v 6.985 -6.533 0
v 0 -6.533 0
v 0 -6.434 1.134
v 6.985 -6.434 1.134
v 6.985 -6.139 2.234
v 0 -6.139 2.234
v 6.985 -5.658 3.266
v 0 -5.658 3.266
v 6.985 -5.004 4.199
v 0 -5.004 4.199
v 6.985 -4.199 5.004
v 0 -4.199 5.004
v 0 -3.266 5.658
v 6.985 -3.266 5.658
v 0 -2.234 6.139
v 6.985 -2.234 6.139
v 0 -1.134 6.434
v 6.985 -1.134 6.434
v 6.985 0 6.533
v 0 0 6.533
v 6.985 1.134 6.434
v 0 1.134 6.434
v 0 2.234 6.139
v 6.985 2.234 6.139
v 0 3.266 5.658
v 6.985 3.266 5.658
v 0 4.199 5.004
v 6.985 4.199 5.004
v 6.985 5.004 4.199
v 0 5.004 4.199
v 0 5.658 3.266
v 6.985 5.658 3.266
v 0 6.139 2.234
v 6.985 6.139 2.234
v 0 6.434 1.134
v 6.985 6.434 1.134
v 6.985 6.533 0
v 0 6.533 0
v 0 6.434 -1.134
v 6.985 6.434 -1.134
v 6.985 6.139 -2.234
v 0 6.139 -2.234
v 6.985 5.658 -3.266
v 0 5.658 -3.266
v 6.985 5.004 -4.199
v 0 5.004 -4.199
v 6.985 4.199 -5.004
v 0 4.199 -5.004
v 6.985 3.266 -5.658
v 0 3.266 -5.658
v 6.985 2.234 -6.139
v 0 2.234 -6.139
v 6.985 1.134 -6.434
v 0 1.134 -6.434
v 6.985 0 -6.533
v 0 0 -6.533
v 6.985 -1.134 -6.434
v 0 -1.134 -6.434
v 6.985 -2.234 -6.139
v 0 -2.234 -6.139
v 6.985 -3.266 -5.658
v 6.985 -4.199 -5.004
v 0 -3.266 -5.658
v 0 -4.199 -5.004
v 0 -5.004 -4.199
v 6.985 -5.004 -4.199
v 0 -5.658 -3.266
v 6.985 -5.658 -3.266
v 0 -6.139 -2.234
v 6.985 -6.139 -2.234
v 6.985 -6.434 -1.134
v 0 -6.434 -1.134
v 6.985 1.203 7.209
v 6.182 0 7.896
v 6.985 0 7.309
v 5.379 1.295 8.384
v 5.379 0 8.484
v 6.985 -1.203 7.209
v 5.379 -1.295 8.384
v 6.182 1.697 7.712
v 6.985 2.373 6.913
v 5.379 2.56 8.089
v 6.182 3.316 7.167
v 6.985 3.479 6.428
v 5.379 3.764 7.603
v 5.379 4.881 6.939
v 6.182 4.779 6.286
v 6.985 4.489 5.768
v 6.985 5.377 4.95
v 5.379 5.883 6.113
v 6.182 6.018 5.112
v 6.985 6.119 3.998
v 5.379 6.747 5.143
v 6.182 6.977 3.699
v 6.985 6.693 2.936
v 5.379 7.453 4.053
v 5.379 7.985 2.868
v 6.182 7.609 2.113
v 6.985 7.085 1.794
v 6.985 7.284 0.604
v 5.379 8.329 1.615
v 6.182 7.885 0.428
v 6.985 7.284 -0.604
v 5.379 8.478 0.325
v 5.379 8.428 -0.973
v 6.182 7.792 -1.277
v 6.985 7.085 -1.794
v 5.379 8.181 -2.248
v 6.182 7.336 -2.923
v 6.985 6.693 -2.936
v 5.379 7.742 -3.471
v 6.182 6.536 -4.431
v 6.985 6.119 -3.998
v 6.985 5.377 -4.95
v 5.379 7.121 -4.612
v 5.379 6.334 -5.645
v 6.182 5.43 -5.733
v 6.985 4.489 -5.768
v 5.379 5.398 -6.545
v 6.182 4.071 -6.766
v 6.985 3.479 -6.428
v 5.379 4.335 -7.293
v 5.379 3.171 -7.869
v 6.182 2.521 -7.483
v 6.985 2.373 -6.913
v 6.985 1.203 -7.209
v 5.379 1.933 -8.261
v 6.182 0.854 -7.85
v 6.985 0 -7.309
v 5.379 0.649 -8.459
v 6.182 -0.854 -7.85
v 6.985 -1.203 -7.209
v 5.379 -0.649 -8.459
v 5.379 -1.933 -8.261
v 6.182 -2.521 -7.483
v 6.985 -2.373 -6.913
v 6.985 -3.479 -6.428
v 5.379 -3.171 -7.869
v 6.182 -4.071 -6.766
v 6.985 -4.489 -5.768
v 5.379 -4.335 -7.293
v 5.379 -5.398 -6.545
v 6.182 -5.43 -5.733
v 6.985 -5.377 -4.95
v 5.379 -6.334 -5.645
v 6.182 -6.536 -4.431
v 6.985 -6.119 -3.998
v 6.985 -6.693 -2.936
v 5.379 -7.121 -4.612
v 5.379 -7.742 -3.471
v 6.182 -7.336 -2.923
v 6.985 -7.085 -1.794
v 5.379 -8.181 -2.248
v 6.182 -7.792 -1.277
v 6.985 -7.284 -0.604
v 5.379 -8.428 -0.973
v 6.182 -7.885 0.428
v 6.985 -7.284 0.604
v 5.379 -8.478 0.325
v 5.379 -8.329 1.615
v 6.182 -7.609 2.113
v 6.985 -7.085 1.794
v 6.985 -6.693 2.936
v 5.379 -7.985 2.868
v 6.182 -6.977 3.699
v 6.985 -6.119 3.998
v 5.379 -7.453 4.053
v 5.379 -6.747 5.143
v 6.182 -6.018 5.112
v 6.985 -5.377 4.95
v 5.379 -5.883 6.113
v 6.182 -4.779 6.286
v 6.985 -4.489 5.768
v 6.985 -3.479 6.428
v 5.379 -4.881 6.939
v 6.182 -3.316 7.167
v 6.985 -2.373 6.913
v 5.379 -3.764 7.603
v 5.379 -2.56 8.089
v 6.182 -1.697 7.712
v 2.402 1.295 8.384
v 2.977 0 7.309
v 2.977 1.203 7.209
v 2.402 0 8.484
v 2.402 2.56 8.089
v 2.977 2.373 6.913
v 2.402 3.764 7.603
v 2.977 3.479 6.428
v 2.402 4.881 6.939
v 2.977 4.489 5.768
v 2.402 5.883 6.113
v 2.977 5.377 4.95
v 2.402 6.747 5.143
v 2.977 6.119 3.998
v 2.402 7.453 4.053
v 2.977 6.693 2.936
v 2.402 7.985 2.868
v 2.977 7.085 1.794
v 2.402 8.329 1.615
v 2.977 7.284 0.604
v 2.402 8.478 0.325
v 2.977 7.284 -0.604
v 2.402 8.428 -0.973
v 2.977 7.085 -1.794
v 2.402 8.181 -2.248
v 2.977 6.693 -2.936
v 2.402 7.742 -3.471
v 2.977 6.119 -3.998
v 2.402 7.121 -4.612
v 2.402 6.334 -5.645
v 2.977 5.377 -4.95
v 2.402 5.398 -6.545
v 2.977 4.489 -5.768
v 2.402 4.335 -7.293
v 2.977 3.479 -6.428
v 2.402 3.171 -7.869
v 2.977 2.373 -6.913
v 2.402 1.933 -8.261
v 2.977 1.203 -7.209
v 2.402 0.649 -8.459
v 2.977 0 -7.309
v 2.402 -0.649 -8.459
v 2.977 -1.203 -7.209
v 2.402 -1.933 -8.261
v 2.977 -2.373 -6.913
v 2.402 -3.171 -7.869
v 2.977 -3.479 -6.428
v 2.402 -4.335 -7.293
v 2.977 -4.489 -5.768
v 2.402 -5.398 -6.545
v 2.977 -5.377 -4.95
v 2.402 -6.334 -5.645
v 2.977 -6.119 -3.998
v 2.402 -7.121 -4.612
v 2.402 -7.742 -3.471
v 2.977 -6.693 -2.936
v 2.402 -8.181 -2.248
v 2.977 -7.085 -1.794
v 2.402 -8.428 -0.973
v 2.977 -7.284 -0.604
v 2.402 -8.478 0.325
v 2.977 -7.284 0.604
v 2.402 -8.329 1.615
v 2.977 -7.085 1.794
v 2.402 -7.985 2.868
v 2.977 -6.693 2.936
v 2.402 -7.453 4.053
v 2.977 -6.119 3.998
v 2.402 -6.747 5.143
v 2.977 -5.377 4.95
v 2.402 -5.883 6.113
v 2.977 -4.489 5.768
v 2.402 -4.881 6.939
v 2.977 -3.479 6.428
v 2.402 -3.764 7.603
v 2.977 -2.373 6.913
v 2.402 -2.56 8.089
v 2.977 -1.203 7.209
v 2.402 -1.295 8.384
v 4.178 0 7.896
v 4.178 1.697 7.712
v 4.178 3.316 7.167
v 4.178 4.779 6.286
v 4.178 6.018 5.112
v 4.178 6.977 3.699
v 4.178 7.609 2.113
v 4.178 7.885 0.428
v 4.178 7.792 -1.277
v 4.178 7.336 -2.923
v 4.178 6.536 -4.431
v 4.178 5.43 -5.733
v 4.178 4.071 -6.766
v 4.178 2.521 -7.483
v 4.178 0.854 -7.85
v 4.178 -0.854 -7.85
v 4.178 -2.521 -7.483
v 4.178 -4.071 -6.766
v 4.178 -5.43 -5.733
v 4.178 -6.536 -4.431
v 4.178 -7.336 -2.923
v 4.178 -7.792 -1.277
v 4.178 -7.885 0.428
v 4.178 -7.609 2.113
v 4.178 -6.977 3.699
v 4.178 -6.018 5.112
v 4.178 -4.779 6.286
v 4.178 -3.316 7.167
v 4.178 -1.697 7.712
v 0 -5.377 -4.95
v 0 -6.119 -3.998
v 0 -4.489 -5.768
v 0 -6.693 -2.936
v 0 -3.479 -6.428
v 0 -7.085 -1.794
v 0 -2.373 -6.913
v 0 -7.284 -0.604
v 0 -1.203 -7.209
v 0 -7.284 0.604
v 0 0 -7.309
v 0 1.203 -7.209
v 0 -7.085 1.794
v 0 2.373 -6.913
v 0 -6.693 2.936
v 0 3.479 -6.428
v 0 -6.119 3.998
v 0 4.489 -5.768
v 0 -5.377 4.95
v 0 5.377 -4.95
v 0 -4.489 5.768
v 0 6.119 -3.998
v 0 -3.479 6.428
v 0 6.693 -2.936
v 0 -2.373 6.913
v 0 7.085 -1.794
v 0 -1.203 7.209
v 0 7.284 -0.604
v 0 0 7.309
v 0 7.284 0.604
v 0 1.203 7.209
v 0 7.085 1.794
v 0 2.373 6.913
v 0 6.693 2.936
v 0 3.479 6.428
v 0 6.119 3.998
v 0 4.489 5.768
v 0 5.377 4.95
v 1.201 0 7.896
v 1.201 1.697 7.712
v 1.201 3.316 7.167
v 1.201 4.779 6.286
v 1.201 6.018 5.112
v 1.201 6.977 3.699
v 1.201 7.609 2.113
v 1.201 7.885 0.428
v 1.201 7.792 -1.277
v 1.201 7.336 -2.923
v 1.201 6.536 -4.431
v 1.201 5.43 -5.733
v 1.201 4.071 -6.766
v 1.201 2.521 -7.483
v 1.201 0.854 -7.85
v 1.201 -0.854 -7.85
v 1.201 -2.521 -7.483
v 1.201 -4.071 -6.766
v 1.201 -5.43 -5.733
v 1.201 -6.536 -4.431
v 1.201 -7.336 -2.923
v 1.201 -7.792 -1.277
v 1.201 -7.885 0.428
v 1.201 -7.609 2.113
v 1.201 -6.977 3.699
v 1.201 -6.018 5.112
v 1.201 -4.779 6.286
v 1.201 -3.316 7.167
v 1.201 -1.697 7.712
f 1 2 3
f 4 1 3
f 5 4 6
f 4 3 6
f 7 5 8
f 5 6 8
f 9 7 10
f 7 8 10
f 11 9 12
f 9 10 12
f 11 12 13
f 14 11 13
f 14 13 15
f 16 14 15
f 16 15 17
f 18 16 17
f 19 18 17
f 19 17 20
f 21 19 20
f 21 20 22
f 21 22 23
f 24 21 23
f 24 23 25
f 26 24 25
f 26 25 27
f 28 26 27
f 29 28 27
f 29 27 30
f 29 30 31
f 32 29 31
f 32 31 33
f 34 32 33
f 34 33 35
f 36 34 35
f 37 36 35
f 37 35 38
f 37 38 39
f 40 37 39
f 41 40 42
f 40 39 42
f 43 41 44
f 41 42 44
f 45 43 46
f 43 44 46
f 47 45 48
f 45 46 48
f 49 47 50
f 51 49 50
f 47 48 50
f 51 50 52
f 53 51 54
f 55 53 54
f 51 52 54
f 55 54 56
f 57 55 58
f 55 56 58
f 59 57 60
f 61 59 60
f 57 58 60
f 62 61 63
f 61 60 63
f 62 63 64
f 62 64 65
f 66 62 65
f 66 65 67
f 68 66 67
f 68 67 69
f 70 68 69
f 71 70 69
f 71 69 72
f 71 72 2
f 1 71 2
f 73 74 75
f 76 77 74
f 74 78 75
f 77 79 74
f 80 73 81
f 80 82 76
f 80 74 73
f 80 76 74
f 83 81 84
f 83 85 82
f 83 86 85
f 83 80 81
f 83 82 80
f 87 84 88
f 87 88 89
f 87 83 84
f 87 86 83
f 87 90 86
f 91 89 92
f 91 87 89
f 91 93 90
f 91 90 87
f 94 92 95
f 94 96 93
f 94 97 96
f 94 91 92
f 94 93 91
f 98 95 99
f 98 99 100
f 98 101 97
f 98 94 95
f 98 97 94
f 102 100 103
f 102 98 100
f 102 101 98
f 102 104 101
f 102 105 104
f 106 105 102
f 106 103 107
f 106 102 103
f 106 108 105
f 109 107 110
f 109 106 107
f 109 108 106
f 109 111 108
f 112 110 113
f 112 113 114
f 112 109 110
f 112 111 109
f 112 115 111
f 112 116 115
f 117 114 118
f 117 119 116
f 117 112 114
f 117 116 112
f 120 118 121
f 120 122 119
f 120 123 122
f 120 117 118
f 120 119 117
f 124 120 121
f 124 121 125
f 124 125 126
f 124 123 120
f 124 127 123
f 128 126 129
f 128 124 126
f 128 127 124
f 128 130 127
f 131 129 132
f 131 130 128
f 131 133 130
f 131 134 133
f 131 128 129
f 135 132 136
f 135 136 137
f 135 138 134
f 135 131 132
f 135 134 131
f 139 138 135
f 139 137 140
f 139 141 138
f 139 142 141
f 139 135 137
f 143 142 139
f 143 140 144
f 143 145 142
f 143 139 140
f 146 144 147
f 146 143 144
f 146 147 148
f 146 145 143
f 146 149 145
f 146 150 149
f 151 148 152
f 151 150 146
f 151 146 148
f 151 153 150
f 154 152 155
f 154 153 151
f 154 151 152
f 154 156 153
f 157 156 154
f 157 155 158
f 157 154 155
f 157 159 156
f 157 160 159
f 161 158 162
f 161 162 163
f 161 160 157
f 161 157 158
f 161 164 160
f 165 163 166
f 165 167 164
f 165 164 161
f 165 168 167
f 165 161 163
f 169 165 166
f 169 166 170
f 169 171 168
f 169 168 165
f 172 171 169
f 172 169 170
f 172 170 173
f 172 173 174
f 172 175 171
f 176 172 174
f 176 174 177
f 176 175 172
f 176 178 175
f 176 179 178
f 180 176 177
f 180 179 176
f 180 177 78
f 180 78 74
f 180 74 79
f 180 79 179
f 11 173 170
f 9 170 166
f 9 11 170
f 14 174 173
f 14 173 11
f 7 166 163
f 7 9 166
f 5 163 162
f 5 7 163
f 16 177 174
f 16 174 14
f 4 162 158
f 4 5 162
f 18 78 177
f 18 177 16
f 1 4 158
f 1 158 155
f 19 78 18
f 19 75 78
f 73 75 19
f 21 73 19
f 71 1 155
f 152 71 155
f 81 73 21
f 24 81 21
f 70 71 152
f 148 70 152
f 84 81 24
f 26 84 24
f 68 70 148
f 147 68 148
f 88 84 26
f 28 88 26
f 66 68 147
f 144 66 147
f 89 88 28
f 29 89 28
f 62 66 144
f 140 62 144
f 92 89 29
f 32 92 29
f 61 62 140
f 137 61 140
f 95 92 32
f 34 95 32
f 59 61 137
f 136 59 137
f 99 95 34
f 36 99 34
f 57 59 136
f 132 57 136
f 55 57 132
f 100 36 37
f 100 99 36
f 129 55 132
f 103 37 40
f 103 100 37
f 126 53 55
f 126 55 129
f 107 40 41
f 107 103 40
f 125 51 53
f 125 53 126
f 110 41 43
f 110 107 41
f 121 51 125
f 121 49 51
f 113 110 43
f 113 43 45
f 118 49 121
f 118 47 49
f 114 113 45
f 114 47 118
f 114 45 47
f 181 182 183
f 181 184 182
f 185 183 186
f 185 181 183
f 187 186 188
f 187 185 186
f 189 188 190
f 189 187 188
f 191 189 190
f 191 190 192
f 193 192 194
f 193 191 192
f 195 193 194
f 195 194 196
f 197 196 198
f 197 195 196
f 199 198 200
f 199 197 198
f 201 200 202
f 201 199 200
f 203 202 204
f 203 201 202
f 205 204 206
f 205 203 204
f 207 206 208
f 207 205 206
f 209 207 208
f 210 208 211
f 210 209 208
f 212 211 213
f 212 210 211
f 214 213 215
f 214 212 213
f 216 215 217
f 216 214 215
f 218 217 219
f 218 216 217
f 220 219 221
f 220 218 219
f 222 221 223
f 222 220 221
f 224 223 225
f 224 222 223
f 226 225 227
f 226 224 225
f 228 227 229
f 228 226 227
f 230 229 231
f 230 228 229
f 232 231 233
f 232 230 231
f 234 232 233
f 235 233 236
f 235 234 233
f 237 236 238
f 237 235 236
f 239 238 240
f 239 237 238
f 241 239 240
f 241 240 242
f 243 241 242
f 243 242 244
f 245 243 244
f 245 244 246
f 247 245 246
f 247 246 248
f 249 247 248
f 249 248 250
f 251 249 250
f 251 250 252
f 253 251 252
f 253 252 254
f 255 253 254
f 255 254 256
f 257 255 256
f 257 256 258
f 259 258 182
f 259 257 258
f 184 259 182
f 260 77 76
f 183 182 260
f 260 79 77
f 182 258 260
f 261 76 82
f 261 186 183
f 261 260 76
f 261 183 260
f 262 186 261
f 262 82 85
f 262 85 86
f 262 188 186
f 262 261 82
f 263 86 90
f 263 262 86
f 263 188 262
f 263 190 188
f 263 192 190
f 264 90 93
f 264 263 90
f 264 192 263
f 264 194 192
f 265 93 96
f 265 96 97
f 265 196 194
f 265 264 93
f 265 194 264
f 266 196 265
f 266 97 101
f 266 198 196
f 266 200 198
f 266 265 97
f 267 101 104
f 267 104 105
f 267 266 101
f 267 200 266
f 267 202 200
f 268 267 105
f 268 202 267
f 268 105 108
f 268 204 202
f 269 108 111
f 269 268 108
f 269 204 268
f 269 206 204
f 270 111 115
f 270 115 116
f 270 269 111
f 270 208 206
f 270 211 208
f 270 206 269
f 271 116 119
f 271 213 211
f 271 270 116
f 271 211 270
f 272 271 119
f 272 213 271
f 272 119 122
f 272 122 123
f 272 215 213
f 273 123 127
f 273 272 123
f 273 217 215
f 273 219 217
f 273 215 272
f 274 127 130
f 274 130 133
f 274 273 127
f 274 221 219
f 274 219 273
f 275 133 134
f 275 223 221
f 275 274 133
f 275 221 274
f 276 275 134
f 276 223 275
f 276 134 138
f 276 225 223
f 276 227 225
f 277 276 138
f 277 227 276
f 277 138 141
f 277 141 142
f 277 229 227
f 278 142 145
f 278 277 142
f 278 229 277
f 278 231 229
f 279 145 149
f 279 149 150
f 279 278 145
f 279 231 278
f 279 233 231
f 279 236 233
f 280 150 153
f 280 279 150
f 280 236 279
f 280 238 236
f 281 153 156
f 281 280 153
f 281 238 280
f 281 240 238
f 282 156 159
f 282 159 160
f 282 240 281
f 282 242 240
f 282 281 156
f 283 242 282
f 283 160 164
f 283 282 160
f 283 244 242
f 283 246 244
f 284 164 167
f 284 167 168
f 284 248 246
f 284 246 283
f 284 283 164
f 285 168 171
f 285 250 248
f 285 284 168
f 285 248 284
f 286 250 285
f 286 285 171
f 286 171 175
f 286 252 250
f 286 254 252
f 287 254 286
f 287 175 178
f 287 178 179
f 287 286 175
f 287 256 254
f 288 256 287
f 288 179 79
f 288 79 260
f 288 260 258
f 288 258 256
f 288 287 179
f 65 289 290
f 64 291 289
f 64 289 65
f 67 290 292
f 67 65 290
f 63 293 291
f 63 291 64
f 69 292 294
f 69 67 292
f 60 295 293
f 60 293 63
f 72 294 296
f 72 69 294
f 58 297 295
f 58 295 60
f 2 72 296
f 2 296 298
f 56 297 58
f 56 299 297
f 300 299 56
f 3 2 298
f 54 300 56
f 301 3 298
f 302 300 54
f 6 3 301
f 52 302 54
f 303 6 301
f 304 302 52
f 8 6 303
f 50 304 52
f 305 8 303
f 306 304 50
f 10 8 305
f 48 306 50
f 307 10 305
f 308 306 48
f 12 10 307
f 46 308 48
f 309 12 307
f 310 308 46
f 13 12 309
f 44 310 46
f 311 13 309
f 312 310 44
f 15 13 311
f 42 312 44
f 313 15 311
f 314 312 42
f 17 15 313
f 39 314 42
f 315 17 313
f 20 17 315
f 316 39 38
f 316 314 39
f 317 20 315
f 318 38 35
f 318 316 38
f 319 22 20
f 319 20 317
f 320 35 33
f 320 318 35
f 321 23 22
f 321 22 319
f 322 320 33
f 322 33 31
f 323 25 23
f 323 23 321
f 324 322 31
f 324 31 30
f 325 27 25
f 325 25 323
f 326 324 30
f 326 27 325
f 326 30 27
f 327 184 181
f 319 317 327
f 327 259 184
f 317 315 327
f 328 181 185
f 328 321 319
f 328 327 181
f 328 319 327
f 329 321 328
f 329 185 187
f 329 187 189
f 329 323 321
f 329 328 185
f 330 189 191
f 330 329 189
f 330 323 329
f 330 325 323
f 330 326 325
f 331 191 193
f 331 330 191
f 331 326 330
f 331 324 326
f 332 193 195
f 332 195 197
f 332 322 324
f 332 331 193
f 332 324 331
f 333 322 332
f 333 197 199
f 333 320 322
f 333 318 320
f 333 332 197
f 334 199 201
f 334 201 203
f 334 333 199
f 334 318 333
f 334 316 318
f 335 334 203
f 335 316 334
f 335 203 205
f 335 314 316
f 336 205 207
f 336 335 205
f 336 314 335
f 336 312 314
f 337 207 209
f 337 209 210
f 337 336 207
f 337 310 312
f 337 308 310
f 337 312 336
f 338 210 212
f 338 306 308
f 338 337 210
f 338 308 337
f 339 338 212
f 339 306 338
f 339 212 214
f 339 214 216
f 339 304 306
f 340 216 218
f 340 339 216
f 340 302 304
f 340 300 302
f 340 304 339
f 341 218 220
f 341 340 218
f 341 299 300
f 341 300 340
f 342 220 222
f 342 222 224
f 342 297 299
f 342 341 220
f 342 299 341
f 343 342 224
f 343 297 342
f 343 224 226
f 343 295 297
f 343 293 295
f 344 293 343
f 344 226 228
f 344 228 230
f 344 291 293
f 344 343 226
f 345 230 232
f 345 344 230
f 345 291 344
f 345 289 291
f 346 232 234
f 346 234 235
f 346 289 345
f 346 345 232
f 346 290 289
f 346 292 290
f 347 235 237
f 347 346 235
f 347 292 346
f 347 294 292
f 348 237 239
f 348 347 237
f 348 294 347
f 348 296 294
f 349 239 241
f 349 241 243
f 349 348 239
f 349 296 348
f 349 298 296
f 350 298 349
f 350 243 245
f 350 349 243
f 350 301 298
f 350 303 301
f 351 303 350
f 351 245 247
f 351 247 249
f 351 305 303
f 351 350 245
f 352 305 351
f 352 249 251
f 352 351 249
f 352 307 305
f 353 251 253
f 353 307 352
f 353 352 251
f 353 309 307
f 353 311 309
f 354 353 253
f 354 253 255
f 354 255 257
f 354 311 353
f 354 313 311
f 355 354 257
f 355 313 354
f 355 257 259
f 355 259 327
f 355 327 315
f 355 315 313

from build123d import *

# Parameters (mm, degrees)
F2_R     = 6.532772
F3_DEPTH = 25.4


with BuildPart() as f1:
    # F0 (on Front) → F1 (revolve)
    with BuildSketch(Plane.XZ):
        Polygon((0, 7.308824), (0, 0), (6.985, 0), (6.985, 7.308824), (2.977107, 7.308824), align=None)
        Polygon((2.40231, 8.483916), (0, 7.308824), (2.977107, 7.308824), align=None)
        Polygon((2.977107, 7.308824), (6.985, 7.308824), (5.379418, 8.483916), align=None)
    revolve(axis=Axis((-6.382353, 0, 0), (-1, 0, 0)))

    # F2 (on face) → F3 (cut)
    with BuildSketch(Plane(origin=(0, 0, 0), x_dir=(0, -1, 0), z_dir=(-1, 0, 0))):
        Circle(F2_R)
    extrude(amount=-F3_DEPTH, mode=Mode.SUBTRACT)


solid = f1.part
